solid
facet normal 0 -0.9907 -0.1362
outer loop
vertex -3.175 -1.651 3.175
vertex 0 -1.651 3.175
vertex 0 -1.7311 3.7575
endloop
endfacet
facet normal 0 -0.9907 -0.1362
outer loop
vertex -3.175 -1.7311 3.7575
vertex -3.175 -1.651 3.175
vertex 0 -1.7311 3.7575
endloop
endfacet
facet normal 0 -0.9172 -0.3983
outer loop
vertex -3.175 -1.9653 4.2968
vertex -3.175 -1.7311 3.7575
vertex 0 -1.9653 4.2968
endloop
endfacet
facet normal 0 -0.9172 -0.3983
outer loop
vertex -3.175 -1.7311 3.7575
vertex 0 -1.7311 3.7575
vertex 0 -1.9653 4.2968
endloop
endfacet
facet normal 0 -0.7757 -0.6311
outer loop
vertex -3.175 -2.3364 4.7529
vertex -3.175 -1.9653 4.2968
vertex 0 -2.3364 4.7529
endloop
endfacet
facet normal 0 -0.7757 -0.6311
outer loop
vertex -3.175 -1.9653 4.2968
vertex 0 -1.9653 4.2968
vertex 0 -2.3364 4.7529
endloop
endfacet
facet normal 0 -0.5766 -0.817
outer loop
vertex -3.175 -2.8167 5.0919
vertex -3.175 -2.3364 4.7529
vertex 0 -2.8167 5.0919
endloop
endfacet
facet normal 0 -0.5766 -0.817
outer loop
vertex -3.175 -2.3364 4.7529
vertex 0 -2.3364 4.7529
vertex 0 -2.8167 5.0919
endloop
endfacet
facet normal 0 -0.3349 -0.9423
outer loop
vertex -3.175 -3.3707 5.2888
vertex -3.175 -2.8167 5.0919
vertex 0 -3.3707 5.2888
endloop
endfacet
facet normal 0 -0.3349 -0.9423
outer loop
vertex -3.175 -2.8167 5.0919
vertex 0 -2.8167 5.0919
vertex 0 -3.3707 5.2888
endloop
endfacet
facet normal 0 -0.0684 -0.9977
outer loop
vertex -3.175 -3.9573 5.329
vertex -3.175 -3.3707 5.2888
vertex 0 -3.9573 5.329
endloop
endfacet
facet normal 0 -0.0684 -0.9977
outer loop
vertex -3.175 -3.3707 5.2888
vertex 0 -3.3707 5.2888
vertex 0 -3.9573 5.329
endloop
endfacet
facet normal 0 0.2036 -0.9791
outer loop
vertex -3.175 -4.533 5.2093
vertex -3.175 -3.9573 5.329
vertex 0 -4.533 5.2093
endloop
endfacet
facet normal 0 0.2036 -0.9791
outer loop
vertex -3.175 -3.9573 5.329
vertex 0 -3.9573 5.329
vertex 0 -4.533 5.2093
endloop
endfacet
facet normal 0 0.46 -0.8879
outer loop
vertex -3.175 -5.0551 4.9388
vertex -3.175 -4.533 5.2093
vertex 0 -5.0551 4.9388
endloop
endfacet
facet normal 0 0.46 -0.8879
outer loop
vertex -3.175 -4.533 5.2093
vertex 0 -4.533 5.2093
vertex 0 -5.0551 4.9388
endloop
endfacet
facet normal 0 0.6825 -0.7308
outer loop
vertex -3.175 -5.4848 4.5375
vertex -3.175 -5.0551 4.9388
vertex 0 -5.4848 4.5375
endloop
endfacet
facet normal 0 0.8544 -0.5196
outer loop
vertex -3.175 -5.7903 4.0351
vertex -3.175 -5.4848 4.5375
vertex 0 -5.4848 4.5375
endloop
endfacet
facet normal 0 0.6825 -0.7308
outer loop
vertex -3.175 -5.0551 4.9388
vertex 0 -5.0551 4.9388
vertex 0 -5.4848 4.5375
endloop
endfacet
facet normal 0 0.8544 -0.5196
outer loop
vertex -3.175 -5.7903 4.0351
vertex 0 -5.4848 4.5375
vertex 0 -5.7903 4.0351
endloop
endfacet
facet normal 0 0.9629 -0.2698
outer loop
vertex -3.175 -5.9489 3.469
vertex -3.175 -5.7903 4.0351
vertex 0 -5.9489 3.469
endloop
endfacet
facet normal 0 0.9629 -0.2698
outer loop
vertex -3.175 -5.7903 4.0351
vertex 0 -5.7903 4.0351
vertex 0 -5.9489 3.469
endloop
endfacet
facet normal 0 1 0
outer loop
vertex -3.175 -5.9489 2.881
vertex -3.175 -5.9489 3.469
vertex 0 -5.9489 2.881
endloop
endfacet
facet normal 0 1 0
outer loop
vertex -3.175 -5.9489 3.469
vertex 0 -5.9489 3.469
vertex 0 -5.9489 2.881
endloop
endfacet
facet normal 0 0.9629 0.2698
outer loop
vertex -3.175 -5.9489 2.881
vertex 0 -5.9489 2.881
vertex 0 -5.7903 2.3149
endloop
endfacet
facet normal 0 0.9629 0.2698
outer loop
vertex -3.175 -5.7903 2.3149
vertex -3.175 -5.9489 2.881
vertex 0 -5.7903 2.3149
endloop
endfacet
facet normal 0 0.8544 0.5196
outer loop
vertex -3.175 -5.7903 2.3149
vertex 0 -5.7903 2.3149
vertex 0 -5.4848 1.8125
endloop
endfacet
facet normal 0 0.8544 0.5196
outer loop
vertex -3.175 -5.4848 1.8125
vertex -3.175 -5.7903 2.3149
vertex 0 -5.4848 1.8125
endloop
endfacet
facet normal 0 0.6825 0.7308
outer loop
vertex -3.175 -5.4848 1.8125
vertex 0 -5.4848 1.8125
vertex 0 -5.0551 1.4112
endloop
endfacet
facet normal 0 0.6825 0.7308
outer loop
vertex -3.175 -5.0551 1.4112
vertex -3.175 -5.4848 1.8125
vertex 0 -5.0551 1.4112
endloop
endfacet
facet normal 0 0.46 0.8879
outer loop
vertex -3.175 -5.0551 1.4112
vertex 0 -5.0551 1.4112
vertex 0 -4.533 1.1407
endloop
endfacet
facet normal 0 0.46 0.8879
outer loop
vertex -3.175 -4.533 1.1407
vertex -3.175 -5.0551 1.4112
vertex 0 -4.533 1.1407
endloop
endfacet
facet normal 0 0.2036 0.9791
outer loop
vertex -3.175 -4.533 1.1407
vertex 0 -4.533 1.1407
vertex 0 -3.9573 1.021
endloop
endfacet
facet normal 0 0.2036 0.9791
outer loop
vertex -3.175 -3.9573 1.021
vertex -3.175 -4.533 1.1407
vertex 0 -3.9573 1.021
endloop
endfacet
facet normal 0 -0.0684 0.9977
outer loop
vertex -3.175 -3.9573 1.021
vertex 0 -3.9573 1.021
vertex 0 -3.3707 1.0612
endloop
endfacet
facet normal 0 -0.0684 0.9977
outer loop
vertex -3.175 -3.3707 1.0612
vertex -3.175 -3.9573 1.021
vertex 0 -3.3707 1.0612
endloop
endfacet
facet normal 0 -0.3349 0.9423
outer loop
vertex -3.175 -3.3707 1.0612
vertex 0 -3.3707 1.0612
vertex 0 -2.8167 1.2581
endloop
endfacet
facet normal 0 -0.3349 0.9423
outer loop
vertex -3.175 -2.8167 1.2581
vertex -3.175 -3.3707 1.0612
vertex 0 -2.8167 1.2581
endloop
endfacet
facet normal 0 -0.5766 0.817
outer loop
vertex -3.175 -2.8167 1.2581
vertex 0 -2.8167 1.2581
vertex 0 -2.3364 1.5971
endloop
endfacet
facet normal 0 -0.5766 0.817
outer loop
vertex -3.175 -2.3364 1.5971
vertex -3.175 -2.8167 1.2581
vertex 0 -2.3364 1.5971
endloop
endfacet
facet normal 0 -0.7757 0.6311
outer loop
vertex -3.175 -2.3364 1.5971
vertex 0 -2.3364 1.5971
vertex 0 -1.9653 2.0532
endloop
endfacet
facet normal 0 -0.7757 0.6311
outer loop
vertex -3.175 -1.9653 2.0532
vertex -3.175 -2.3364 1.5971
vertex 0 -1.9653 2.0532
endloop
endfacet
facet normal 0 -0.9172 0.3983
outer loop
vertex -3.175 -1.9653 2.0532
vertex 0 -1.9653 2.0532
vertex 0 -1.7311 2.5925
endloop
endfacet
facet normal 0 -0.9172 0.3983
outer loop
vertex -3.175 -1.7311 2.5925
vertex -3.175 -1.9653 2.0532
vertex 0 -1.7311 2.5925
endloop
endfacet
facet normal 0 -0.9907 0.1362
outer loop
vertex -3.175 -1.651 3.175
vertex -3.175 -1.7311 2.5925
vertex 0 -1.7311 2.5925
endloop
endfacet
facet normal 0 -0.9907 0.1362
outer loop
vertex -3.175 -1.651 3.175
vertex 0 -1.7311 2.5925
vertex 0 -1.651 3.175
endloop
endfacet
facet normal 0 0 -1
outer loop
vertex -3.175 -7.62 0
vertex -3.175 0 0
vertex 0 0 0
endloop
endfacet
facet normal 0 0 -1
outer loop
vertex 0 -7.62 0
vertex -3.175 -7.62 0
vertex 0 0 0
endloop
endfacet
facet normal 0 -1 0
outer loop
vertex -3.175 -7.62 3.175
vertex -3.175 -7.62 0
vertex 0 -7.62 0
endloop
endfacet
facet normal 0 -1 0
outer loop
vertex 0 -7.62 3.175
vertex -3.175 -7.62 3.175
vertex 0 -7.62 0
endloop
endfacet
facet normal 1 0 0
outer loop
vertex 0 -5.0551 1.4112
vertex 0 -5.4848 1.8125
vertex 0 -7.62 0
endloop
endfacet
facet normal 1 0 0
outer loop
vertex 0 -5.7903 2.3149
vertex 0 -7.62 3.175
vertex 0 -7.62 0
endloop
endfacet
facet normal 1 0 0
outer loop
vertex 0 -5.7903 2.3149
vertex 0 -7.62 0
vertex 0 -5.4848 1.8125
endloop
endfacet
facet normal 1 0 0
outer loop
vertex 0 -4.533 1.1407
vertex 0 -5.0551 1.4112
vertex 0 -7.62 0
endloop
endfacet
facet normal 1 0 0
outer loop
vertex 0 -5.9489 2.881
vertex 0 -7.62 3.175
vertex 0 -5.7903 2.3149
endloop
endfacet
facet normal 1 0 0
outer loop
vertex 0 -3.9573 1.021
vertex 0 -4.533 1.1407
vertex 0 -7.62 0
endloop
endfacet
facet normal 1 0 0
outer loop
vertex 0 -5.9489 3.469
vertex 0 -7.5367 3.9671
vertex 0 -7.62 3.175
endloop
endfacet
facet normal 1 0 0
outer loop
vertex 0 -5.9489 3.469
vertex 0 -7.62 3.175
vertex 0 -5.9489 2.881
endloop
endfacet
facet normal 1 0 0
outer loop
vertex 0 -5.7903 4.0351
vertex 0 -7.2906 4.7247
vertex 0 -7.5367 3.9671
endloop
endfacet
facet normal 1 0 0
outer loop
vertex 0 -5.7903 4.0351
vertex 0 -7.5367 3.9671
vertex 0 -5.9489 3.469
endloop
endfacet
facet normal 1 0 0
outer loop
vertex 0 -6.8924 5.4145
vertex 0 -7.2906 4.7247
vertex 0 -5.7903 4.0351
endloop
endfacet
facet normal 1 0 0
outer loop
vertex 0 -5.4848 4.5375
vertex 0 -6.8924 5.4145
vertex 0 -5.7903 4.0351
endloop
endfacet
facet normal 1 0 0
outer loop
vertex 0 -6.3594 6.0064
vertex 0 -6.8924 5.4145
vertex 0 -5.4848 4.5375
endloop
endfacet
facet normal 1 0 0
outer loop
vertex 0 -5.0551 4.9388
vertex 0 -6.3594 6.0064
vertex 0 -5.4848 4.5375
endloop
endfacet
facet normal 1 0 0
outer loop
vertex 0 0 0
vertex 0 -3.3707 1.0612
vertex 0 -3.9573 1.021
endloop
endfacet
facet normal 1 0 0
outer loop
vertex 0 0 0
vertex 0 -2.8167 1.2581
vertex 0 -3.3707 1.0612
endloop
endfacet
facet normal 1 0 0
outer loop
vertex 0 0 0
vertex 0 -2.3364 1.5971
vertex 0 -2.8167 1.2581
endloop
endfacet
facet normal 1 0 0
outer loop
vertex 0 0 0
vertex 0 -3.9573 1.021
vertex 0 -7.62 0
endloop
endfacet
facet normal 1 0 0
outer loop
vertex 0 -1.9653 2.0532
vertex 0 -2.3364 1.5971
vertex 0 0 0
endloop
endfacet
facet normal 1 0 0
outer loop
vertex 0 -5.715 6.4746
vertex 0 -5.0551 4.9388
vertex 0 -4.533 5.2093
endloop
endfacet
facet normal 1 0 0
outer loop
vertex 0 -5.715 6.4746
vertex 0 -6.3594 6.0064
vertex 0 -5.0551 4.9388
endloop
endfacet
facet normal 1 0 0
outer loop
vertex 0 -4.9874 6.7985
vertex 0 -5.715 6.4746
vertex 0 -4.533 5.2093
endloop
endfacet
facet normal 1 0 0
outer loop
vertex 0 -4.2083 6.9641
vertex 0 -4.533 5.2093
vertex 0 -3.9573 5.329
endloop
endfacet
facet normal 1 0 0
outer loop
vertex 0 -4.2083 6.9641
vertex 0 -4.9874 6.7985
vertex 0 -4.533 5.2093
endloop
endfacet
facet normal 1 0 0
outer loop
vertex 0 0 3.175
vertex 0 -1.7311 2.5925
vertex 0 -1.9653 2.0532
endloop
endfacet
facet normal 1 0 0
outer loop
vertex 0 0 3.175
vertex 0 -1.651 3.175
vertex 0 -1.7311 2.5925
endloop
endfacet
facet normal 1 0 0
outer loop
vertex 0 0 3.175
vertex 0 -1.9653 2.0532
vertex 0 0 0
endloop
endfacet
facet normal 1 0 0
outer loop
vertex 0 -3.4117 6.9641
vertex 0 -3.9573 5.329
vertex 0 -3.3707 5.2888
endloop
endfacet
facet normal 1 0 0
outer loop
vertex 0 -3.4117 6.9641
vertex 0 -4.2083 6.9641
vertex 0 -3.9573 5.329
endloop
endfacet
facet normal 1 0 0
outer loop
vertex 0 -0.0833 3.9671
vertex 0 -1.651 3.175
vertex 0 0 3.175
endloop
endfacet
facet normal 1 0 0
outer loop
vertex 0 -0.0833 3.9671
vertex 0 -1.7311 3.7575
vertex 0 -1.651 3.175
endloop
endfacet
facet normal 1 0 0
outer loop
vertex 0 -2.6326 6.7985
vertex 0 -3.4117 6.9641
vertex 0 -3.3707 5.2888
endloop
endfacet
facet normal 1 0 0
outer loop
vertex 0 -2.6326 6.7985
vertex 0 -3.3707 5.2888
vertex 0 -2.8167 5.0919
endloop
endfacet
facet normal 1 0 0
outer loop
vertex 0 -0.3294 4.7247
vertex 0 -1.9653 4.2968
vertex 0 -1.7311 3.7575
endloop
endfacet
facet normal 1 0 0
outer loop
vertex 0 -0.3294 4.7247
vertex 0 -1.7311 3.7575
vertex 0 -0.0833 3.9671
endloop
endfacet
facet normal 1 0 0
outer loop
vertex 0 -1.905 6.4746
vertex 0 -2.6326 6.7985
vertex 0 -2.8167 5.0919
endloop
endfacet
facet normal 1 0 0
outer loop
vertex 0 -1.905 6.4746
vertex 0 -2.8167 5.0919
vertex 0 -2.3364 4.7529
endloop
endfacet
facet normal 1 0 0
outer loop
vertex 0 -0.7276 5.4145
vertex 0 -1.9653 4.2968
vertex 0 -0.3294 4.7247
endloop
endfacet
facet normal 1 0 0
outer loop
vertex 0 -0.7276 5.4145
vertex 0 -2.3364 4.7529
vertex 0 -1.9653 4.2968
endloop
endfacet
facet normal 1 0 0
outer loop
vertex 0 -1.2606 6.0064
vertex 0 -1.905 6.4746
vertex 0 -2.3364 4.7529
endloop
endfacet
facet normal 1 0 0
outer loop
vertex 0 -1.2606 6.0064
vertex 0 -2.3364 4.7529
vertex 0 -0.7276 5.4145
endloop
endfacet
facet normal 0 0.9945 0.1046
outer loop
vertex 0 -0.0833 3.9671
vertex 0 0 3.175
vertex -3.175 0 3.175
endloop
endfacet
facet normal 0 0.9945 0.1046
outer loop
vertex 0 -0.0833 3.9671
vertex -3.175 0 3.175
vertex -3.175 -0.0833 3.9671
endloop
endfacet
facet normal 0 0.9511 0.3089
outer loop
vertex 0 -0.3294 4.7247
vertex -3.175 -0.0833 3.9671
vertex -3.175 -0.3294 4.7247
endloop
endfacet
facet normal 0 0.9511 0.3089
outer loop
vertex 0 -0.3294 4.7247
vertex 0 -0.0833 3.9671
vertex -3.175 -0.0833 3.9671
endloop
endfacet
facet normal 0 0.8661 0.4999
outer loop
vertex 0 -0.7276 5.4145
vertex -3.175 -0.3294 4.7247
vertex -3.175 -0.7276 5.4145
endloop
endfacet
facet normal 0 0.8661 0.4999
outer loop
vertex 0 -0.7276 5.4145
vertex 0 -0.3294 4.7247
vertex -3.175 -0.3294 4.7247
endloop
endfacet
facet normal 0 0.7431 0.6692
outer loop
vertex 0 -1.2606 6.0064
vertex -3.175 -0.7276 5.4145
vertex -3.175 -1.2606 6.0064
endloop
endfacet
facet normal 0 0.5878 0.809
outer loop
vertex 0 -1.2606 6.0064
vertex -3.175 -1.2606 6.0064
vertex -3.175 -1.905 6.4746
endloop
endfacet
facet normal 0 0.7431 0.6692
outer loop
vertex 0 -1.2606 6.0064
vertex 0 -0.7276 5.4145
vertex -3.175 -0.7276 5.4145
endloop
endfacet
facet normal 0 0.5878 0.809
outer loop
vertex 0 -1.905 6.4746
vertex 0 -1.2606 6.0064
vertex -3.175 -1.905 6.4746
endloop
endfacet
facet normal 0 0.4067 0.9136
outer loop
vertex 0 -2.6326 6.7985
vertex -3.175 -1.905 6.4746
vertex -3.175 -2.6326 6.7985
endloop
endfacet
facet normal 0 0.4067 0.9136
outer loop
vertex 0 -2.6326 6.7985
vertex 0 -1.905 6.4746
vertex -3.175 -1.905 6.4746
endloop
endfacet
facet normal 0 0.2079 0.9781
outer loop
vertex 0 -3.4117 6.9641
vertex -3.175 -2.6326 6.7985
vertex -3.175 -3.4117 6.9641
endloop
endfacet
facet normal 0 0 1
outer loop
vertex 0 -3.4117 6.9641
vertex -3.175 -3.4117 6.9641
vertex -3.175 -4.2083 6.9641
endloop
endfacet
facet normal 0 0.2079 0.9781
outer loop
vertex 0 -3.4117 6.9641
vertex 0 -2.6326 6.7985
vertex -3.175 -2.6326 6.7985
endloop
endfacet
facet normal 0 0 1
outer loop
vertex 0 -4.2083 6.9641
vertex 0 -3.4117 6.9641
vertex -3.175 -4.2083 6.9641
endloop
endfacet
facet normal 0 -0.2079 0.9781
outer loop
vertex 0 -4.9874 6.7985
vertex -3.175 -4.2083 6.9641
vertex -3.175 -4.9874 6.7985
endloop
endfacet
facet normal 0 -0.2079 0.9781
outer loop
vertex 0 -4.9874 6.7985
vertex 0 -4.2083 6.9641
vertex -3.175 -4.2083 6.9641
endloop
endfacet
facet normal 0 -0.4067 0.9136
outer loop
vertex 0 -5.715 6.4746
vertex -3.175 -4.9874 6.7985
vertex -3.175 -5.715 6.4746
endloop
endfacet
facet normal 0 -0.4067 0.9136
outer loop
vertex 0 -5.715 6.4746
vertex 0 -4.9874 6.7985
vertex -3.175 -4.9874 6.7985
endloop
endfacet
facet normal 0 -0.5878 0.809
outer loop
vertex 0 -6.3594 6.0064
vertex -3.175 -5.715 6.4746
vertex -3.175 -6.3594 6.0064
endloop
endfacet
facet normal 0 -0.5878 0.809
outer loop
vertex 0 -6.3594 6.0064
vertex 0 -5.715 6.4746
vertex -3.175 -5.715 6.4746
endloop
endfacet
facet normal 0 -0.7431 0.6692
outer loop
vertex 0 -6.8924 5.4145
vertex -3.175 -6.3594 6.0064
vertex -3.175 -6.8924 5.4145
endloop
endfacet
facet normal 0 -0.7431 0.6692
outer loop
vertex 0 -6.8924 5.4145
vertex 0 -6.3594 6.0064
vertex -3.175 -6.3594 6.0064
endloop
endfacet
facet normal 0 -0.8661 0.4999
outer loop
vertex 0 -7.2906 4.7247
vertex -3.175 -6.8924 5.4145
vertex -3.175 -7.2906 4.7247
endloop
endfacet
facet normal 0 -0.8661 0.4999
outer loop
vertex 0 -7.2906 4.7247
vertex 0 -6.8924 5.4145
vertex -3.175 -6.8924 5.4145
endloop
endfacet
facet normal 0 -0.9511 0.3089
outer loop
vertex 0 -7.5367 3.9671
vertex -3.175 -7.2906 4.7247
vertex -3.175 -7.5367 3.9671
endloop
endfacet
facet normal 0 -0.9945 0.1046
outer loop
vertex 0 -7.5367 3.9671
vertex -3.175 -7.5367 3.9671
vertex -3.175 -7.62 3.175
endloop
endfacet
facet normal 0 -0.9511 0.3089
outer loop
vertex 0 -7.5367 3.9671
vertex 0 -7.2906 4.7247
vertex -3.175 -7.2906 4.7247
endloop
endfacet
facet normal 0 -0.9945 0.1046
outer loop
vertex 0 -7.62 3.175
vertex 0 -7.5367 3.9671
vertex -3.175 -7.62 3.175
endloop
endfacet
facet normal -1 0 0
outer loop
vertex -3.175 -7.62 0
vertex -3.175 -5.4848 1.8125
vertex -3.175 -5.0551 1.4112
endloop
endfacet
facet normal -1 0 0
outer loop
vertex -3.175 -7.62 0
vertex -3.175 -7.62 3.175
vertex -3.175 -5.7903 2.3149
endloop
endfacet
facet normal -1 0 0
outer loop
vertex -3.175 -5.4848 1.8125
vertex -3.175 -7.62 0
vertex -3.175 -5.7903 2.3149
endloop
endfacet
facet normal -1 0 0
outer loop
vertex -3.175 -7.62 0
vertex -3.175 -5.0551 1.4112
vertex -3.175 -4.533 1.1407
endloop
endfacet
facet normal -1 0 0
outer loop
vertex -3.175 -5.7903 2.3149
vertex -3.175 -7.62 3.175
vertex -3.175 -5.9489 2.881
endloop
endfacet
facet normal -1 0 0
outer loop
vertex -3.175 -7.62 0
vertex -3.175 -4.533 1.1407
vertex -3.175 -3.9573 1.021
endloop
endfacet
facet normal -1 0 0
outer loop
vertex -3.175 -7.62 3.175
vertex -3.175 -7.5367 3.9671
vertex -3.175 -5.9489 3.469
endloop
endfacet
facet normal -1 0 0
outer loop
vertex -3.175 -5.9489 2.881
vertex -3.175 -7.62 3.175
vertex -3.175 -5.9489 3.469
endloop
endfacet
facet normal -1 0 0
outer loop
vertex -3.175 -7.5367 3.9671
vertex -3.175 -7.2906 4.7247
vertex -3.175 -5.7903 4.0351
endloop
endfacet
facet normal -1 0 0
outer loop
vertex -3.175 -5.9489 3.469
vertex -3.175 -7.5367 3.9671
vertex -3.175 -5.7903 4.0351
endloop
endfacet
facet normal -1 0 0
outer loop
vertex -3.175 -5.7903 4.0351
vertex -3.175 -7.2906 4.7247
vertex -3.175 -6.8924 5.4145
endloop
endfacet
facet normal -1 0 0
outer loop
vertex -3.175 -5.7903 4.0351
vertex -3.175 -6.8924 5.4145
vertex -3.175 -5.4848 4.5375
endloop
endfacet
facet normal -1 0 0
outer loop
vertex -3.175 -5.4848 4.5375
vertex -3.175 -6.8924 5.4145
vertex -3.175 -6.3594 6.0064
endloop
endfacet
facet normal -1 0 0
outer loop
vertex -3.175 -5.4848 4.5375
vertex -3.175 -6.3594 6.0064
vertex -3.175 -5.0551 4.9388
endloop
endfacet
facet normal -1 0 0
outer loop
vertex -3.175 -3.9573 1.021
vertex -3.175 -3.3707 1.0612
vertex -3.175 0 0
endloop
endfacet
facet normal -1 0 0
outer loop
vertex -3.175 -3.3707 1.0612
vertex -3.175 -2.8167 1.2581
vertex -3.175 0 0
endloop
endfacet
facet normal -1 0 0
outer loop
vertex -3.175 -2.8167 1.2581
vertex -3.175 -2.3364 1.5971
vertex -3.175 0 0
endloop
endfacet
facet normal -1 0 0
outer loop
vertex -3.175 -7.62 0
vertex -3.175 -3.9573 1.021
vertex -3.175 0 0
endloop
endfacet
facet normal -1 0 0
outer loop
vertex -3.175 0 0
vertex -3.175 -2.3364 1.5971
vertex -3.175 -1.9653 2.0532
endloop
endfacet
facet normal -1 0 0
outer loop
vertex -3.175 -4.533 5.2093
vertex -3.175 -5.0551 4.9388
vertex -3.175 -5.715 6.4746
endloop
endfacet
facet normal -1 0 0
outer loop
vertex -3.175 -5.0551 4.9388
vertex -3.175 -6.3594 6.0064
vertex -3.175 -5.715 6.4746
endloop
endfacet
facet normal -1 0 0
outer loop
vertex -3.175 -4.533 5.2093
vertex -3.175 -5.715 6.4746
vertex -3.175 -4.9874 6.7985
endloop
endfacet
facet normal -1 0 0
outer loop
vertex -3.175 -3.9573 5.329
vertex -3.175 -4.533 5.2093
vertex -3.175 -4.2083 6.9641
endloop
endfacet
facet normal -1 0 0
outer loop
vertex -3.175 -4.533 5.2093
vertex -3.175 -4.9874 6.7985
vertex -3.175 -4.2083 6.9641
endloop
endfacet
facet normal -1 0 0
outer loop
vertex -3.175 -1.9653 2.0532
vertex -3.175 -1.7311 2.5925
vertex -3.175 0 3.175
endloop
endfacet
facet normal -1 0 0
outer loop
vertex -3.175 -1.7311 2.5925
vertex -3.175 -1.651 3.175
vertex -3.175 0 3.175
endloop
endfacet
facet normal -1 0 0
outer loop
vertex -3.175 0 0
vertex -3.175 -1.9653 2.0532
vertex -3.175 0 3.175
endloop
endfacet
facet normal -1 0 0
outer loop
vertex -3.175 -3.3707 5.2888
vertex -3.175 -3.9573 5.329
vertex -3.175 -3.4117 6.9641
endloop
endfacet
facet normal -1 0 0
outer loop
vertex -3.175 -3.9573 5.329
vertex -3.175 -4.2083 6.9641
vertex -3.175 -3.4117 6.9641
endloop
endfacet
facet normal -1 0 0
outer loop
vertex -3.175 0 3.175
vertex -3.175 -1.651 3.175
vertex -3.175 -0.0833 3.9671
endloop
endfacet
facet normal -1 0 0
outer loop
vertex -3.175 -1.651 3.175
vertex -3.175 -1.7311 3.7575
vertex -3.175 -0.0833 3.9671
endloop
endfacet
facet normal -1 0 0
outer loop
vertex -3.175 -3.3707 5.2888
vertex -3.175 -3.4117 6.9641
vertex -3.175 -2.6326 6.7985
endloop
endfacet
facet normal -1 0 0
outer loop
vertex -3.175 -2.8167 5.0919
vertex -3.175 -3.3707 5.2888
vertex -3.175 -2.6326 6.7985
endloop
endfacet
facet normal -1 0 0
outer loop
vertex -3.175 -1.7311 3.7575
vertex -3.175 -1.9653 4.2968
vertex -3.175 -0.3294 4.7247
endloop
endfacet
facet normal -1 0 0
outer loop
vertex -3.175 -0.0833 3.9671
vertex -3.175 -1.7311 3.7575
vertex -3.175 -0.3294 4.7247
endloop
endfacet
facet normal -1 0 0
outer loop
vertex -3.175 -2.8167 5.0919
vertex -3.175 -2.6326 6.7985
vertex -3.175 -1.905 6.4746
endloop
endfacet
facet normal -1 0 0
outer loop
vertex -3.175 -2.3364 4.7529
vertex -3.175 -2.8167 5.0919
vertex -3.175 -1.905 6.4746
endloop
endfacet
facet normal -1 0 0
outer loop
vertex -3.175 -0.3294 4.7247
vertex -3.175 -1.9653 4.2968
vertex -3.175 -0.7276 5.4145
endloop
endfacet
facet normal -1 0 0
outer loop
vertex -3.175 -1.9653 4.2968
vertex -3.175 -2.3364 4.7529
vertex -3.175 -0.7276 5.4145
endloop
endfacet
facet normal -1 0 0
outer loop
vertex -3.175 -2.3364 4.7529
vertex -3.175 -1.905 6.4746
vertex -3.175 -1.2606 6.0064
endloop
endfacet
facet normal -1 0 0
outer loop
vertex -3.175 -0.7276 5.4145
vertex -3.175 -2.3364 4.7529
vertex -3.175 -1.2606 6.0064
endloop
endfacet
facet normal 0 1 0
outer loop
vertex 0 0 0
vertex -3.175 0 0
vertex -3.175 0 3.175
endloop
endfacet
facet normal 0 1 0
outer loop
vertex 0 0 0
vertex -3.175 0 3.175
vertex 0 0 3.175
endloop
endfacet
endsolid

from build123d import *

# Parameters (mm, degrees)
F0_W     = 3.175
F0_H     = 7.62
F1_DEPTH = 3.175
F3_DEPTH = 3.175
F4_R     = 2.159
F5_DEPTH = 25.4


with BuildPart() as f1:
    # F0 (on Top) → F1 (new body)
    with BuildSketch(Plane.XY):
        with Locations((-1.5875, -3.81)):
            Rectangle(F0_W, F0_H)
    extrude(amount=F1_DEPTH)

    # F2 (on face) → F3 (join)
    with BuildSketch(Plane.YZ):
        with BuildLine():
            Line((-7.62, 3.175), (0, 3.175))
            ThreePointArc((0, 3.175), (-3.81, 6.985), (-7.62, 3.175))
        make_face()
    extrude(amount=-F3_DEPTH)

    # F4 (on face) → F5 (cut)
    with BuildSketch(Plane.YZ):
        with Locations((-3.81, 3.175)):
            Circle(F4_R)
    extrude(amount=-F5_DEPTH, mode=Mode.SUBTRACT)


solid = f1.part
